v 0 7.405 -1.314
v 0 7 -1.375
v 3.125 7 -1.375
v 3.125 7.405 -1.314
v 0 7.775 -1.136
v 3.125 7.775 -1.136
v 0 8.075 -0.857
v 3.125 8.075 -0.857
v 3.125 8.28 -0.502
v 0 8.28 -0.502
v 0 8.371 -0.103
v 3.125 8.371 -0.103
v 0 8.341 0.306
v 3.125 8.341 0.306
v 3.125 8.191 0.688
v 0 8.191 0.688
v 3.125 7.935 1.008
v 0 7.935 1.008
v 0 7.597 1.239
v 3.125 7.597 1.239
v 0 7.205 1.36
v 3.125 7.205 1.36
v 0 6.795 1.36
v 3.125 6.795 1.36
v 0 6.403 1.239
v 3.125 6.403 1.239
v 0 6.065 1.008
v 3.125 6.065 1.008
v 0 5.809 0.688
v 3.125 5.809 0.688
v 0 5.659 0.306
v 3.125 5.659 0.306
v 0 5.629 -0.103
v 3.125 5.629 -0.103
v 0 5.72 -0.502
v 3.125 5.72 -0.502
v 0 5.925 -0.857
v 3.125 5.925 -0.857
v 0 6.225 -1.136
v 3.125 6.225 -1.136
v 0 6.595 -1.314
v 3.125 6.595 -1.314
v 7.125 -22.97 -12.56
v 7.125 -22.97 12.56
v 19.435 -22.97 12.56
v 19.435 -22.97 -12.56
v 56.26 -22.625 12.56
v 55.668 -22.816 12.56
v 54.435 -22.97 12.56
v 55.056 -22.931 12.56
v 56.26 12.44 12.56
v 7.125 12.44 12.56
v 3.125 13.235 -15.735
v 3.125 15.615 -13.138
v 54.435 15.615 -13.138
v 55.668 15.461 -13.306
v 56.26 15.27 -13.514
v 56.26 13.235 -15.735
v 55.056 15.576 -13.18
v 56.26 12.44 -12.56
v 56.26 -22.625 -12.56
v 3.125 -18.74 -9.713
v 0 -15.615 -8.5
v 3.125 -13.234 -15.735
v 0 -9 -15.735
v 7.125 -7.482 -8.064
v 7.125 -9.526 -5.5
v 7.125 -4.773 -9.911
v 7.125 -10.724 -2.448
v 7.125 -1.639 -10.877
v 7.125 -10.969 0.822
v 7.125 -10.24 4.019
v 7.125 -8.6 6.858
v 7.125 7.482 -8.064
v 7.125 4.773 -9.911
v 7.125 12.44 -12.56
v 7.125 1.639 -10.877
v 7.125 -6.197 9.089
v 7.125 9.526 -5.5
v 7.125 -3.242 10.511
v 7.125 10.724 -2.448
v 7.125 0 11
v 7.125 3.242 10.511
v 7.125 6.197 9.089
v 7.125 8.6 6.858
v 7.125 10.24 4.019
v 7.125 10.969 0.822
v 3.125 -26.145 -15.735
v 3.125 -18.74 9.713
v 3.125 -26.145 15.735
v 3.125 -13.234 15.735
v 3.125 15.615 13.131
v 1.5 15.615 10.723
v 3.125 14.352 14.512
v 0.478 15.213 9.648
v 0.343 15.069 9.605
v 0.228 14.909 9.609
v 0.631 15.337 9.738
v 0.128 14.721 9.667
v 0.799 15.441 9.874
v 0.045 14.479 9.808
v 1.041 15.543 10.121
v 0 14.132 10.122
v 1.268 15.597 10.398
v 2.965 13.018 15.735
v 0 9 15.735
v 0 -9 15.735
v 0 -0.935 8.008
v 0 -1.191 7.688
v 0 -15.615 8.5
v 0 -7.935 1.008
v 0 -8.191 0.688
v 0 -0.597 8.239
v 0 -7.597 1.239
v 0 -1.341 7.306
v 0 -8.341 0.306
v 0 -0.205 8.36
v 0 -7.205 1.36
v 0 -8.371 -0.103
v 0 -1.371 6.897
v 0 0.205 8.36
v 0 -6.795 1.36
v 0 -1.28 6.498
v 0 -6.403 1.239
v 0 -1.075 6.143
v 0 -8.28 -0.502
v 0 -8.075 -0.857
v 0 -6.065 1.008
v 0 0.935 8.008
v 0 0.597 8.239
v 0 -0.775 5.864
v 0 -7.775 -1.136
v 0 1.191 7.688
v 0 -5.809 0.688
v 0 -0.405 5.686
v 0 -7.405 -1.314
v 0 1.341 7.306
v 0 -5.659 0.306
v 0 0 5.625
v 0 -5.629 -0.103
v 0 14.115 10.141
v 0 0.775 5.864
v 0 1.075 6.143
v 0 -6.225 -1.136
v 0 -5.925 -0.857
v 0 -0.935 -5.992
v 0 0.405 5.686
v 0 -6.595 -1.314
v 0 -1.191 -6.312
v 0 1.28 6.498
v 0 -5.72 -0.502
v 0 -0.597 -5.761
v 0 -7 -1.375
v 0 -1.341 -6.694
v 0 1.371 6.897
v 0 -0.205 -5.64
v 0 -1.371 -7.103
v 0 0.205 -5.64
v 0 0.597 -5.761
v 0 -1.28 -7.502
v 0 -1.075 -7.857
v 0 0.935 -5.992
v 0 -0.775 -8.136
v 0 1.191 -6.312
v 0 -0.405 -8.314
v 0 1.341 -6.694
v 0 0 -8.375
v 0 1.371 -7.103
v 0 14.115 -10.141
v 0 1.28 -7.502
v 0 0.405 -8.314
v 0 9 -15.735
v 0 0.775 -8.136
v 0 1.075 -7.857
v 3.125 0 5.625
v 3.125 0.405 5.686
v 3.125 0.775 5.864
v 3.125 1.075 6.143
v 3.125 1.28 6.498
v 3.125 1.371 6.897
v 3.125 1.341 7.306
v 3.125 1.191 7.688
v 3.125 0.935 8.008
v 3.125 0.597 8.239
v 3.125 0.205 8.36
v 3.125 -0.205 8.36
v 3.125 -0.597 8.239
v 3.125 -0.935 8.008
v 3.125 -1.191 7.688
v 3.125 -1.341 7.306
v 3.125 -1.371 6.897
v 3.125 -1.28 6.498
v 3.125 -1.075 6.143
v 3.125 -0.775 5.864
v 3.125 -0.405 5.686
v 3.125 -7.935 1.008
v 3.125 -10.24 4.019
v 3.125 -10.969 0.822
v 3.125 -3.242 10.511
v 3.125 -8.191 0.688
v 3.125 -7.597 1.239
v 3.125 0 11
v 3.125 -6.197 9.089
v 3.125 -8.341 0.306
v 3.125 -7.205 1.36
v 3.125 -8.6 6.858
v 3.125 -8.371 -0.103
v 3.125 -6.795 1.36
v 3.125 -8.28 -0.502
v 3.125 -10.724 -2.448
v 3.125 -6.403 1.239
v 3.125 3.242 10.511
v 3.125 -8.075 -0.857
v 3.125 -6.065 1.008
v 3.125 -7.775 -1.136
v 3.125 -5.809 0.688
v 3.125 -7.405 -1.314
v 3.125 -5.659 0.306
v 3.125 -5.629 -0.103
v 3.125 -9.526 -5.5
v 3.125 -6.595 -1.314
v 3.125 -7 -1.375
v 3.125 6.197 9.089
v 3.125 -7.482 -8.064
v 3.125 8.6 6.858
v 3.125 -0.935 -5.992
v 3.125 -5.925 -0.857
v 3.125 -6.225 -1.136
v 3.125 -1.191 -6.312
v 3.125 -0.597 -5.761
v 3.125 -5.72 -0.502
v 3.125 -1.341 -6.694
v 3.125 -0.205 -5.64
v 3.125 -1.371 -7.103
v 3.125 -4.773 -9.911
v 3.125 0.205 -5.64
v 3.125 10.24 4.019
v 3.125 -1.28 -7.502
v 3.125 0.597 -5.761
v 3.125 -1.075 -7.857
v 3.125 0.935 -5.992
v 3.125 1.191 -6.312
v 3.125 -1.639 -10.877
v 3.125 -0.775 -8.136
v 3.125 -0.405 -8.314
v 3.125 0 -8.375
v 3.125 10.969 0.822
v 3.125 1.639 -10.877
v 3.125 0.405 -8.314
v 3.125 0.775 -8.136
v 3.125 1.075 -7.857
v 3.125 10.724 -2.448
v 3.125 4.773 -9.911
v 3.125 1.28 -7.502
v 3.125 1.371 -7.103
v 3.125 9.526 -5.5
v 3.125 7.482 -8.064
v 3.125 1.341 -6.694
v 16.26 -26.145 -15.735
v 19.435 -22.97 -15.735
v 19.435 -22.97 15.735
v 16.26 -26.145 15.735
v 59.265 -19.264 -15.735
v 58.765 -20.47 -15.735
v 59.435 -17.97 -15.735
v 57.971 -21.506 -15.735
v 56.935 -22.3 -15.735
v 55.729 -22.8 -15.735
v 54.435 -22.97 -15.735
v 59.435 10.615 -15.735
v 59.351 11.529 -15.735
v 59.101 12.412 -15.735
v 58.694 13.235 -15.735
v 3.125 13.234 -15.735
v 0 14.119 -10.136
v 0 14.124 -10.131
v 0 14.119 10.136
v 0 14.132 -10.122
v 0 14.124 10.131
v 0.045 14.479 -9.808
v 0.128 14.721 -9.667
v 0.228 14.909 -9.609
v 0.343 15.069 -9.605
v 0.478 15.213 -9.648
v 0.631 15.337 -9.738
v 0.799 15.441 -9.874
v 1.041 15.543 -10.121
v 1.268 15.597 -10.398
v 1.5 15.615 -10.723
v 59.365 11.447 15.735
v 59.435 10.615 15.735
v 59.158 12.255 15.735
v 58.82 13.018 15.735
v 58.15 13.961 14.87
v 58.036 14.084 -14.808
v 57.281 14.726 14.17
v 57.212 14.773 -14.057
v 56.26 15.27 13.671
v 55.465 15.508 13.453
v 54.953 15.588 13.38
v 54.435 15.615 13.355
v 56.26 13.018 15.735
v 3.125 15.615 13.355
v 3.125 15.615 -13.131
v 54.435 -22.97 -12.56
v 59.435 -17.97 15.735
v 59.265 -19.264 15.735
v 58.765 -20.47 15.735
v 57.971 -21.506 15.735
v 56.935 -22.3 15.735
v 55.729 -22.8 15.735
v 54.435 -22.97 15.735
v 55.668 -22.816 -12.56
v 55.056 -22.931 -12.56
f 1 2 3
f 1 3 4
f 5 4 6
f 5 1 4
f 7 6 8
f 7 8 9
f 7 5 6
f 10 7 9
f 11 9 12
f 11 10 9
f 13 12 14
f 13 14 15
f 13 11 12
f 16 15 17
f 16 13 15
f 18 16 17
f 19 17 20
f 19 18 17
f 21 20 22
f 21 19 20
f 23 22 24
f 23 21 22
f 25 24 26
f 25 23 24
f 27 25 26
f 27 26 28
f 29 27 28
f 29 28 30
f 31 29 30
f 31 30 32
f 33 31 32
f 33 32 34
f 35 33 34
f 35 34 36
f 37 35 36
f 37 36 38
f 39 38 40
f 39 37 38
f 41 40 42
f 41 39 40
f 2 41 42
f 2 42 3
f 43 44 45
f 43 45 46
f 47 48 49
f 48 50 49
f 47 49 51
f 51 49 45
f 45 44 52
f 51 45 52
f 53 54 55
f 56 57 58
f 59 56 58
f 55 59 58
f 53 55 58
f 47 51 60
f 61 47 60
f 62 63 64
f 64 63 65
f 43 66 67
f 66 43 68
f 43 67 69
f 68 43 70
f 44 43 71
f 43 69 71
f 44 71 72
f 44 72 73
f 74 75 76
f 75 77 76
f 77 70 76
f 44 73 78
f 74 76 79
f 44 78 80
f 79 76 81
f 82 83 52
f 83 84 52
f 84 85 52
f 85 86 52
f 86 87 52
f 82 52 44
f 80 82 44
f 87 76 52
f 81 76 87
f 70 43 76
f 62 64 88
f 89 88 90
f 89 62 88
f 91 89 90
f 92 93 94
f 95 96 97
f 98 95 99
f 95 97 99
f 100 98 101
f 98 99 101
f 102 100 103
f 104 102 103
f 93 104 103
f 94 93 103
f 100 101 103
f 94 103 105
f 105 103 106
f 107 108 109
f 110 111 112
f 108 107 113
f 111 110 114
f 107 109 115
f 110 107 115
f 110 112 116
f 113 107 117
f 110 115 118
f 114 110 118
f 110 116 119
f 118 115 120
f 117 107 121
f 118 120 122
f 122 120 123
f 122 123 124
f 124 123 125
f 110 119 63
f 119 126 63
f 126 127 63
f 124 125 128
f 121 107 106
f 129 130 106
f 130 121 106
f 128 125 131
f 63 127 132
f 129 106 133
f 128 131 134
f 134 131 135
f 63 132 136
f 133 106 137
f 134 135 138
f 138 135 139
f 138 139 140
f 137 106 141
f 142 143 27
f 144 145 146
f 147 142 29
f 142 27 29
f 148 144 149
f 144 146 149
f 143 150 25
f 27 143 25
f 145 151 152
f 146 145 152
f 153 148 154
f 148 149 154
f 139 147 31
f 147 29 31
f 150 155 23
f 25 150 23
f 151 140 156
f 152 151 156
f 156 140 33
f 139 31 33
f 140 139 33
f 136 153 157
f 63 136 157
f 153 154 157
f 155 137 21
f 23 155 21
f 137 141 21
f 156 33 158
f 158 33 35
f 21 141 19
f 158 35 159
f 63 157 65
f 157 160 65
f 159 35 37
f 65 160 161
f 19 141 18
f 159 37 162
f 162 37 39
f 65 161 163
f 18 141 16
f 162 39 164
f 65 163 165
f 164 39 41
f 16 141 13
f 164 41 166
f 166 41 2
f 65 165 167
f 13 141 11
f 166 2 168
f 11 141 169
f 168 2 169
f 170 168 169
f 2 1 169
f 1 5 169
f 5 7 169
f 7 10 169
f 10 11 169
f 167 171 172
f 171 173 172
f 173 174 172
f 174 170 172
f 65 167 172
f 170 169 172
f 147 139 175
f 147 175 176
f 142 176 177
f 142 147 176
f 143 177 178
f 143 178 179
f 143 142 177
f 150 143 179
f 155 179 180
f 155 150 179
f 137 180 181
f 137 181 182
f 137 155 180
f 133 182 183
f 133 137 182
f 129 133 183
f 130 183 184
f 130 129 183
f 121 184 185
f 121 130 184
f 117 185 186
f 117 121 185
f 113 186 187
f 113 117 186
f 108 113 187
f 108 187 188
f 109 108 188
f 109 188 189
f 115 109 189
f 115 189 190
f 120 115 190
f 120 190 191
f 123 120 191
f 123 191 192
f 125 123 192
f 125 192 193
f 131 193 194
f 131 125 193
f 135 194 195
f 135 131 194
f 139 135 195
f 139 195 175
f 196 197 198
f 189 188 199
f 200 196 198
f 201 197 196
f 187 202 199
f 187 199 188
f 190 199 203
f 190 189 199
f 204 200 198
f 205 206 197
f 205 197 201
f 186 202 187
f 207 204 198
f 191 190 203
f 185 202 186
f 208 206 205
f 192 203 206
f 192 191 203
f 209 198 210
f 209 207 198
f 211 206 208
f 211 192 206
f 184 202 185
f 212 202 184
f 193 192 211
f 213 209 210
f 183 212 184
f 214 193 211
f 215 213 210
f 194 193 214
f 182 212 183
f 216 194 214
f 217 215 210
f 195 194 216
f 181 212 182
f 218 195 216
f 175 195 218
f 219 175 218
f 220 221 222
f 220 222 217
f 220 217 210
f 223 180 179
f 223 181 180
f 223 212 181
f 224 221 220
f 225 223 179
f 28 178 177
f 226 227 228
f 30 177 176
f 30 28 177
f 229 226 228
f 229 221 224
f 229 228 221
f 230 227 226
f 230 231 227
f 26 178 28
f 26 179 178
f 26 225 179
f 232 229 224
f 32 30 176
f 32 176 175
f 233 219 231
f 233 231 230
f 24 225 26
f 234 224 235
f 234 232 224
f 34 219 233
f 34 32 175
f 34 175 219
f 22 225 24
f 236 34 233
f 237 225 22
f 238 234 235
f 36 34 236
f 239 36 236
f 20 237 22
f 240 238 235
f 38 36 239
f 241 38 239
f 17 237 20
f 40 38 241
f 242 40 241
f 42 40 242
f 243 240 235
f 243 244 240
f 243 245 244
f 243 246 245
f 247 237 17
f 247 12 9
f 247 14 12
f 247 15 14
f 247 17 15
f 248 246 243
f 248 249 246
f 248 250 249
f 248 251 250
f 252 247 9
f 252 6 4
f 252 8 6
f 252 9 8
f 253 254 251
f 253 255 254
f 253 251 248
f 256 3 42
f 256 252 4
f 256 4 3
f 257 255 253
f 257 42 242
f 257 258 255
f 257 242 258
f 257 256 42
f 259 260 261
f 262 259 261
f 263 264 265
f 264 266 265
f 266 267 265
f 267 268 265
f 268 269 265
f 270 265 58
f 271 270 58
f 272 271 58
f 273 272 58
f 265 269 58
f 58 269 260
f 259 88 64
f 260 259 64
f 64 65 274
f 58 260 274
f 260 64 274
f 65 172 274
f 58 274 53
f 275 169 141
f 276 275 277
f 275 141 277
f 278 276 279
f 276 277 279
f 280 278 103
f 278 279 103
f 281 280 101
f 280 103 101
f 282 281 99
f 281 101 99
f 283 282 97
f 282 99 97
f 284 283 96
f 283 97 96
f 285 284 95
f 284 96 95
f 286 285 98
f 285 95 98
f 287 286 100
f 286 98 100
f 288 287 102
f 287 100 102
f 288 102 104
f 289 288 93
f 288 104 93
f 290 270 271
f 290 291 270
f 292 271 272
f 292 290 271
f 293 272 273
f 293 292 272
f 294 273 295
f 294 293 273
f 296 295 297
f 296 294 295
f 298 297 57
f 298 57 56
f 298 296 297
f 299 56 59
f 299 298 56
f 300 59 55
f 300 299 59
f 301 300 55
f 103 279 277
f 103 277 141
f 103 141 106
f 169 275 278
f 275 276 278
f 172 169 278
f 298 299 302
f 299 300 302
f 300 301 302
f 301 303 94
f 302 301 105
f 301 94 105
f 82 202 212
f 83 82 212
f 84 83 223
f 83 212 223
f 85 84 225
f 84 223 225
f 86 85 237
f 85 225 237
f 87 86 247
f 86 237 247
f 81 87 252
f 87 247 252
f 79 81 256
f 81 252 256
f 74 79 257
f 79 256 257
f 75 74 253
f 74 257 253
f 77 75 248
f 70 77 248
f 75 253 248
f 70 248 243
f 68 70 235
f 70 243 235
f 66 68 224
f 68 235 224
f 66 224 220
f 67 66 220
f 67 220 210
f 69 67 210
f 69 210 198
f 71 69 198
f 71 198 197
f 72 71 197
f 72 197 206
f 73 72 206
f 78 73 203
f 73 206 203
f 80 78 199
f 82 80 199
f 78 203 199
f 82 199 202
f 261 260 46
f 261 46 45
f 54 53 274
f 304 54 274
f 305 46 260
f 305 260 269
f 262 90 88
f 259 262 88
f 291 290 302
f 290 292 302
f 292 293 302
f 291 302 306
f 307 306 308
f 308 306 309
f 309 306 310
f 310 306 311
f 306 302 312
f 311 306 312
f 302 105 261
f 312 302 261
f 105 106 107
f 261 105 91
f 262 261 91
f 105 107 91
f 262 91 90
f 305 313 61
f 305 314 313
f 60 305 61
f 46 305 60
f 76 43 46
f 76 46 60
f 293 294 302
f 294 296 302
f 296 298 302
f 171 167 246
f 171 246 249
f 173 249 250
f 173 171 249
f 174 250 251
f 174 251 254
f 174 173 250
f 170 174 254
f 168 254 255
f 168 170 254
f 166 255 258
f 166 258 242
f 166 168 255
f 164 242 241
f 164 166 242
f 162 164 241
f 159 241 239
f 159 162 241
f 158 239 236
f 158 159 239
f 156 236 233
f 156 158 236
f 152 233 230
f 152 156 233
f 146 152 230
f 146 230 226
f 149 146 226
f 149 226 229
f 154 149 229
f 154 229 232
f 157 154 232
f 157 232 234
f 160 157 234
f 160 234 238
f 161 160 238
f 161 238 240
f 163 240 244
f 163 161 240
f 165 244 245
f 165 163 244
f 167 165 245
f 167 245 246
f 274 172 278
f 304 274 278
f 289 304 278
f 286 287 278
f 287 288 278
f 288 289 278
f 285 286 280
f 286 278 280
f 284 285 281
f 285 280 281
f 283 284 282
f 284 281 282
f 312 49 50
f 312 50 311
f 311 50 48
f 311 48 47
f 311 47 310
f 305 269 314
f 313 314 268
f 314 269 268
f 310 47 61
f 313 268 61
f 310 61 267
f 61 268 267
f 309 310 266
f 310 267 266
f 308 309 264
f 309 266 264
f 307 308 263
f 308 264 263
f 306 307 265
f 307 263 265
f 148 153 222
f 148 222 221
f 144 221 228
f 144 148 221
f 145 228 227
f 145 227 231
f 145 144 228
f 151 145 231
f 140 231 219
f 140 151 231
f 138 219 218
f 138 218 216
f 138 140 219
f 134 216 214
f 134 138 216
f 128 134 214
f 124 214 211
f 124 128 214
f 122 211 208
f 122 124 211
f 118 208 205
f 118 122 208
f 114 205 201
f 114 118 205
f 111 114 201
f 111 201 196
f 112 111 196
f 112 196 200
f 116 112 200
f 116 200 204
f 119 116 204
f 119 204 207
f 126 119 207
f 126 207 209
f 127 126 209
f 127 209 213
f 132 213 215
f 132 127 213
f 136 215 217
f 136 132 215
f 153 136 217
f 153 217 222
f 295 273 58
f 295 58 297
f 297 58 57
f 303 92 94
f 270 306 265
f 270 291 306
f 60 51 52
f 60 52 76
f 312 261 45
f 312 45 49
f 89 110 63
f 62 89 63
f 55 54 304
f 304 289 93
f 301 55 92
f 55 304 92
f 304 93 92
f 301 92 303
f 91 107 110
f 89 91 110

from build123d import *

# Parameters (mm, degrees)
SKETCH2_R           = 1.375
BOSS_EXTRUDE1_DEPTH = 3.125
SKETCH3_R           = 11
BOSS_EXTRUDE2_DEPTH = 4
FILLET1_SIZE        = 3.125
SKETCH4_W           = 31.47
SKETCH4_H           = 41.76
SKETCH4_W_2         = 25.12
SKETCH4_H_2         = 35.41
BOSS_EXTRUDE3_DEPTH = 49.135
CHAMFER1_SIZE       = 2.38
CHAMFER1_SIZE_2     = 2.597314233
BOSS_EXTRUDE4_DEPTH = 3.175
SKETCH6_W           = 40
SKETCH6_H           = 31.47
CUT_EXTRUDE1_DEPTH  = 3.175
CHAMFER2_SIZE       = 3.175
FILLET3_R           = 5
FILLET4_R           = 5
FILLET5_R           = 1.5


# Some blends are built 0.0001 mm under size
with BuildPart() as part:
    # Sketch2 → Boss-Extrude1 (new body)
    with BuildSketch(Plane(origin=(0, 0, 0), x_dir=(0, 0, -1), z_dir=(1, 0, 0))):
        Polygon((0, 15.615), (-8.5, 15.615), (-15.735, 9), (-15.735, 0), (-15.735, -9), (-8.5, -15.615), (0, -15.615), (8.5, -15.615), (15.735, -9), (15.735, 0), (15.735, 9), (8.5, 15.615), align=None)
        with Locations((0, 7)):
            Circle(SKETCH2_R, mode=Mode.SUBTRACT)
        with Locations((-7, 0)):
            Circle(SKETCH2_R, mode=Mode.SUBTRACT)
        with Locations((7, 0)):
            Circle(SKETCH2_R, mode=Mode.SUBTRACT)
        with Locations((0, -7)):
            Circle(SKETCH2_R, mode=Mode.SUBTRACT)
    extrude(amount=BOSS_EXTRUDE1_DEPTH)

    # Sketch3 → Boss-Extrude2 (add)
    with BuildSketch(Plane.ZY.offset(-3.125)):
        Polygon((-15.735, -9), (-15.735, -26.145), (15.735, -26.145), (15.735, -9), (15.735, 9), (15.735, 15.615), (8.5, 15.615), (-8.5, 15.615), (-15.735, 15.615), (-15.735, 9), align=None)
        Circle(SKETCH3_R, mode=Mode.SUBTRACT)
    extrude(amount=-BOSS_EXTRUDE2_DEPTH)

    # Fillet1
    fillet1_edges = [part.edges().sort_by_distance(p)[0] for p in [
        (3.125, 12.3075, 12.1175),
        (3.125, 12.3075, -12.1175),
        (3.125, -12.3075, -12.1175),
        (3.125, -15.615, 0),
        (3.125, -12.3075, 12.1175),
    ]]
    chamfer(fillet1_edges, length=FILLET1_SIZE - 0.0001)  # a hair under: the kernel refuses the full size

    # Sketch4 → Boss-Extrude3 (add)
    with BuildSketch(Plane(origin=(7.125, 0, 0), x_dir=(0, 0, -1), z_dir=(1, 0, 0))):
        with Locations((0, -5.265)):
            Rectangle(SKETCH4_W, SKETCH4_H)
        with Locations((0, -5.265)):
            Rectangle(SKETCH4_W_2, SKETCH4_H_2, mode=Mode.SUBTRACT)
    extrude(amount=BOSS_EXTRUDE3_DEPTH)

    # Chamfer1
    # the kernel refuses this chamfer: 2.597314233, 2.38 mm, written as the material it takes off along each edge
    with BuildSketch(Plane(origin=(-3.562082301, 15.615, 15.735), x_dir=(0, 0.031246667353746232, -0.9995117036729906), z_dir=(1, 0, 0))) as chamfer1_piece_1:
        Polygon((CHAMFER1_SIZE * 0.999511703673, -CHAMFER1_SIZE * 0.0312466673537), (-CHAMFER1_SIZE_2 * 0.0312466673483, -CHAMFER1_SIZE_2 * 0.999511703498), (0, 0), align=None)
    extrude(amount=66.509164603, mode=Mode.SUBTRACT)
    with BuildSketch(Plane(origin=(62.947082301, 15.615, -15.735), x_dir=(0, 0.02624044362699192, 0.999655660274206), z_dir=(-1, 0, 0))) as chamfer1_piece_2:
        Polygon((CHAMFER1_SIZE_2 * 0.999655660099, -CHAMFER1_SIZE_2 * 0.0262404436224), (-CHAMFER1_SIZE * 0.026240443627, -CHAMFER1_SIZE * 0.999655660274), (0, 0), align=None)
    extrude(amount=66.509164603, mode=Mode.SUBTRACT)

    # Sketch5 → Boss-Extrude4 (add)
    with BuildSketch(Plane(origin=(56.26, 0, 0), x_dir=(0, 0, -1), z_dir=(1, 0, 0))):
        Polygon((13.137685767, 15.615), (-13.355, 15.615), (-15.735, 13.017685767), (-15.735, -26.145), (15.735, -26.145), (15.735, 13.235), align=None)
    extrude(amount=BOSS_EXTRUDE4_DEPTH)

    # Sketch6 → Cut-Extrude1 (cut)
    with BuildSketch(Plane.XZ.offset(26.145)):
        with Locations((39.435, 0)):
            Rectangle(SKETCH6_W, SKETCH6_H)
    extrude(amount=-CUT_EXTRUDE1_DEPTH, mode=Mode.SUBTRACT)

    # Chamfer2
    chamfer2_edges = [part.edges().sort_by_distance(p)[0] for p in [
        (19.435, -26.145, 0),
    ]]
    chamfer(chamfer2_edges, length=CHAMFER2_SIZE - 0.0001)  # a hair under: the kernel refuses the full size

    # Fillet3
    fillet3_edges = [part.edges().sort_by_distance(p)[0] for p in [
        (59.435, 15.615, 0.108657116),
    ]]
    fillet(fillet3_edges, radius=FILLET3_R)

    # Fillet4
    # the kernel refuses this fillet: 5 mm, written as the material it takes off along each edge
    with BuildSketch(Plane(origin=(59.435, -22.97, -28.235), x_dir=(0, 1, 0), z_dir=(0, 0, 1))) as fillet4_piece_1:
        with BuildLine():
            CenterArc((FILLET4_R, FILLET4_R), FILLET4_R, 180, 90)
            Line((0, FILLET4_R), (0, 0))
            Line((0, 0), (FILLET4_R, 0))
        make_face()
    extrude(amount=56.47, mode=Mode.SUBTRACT)

    # Fillet5
    fillet5_edges = [part.edges().sort_by_distance(p)[0] for p in [
        (0, 15.615, 0),
    ]]
    fillet(fillet5_edges, radius=FILLET5_R)


solid = part.part
